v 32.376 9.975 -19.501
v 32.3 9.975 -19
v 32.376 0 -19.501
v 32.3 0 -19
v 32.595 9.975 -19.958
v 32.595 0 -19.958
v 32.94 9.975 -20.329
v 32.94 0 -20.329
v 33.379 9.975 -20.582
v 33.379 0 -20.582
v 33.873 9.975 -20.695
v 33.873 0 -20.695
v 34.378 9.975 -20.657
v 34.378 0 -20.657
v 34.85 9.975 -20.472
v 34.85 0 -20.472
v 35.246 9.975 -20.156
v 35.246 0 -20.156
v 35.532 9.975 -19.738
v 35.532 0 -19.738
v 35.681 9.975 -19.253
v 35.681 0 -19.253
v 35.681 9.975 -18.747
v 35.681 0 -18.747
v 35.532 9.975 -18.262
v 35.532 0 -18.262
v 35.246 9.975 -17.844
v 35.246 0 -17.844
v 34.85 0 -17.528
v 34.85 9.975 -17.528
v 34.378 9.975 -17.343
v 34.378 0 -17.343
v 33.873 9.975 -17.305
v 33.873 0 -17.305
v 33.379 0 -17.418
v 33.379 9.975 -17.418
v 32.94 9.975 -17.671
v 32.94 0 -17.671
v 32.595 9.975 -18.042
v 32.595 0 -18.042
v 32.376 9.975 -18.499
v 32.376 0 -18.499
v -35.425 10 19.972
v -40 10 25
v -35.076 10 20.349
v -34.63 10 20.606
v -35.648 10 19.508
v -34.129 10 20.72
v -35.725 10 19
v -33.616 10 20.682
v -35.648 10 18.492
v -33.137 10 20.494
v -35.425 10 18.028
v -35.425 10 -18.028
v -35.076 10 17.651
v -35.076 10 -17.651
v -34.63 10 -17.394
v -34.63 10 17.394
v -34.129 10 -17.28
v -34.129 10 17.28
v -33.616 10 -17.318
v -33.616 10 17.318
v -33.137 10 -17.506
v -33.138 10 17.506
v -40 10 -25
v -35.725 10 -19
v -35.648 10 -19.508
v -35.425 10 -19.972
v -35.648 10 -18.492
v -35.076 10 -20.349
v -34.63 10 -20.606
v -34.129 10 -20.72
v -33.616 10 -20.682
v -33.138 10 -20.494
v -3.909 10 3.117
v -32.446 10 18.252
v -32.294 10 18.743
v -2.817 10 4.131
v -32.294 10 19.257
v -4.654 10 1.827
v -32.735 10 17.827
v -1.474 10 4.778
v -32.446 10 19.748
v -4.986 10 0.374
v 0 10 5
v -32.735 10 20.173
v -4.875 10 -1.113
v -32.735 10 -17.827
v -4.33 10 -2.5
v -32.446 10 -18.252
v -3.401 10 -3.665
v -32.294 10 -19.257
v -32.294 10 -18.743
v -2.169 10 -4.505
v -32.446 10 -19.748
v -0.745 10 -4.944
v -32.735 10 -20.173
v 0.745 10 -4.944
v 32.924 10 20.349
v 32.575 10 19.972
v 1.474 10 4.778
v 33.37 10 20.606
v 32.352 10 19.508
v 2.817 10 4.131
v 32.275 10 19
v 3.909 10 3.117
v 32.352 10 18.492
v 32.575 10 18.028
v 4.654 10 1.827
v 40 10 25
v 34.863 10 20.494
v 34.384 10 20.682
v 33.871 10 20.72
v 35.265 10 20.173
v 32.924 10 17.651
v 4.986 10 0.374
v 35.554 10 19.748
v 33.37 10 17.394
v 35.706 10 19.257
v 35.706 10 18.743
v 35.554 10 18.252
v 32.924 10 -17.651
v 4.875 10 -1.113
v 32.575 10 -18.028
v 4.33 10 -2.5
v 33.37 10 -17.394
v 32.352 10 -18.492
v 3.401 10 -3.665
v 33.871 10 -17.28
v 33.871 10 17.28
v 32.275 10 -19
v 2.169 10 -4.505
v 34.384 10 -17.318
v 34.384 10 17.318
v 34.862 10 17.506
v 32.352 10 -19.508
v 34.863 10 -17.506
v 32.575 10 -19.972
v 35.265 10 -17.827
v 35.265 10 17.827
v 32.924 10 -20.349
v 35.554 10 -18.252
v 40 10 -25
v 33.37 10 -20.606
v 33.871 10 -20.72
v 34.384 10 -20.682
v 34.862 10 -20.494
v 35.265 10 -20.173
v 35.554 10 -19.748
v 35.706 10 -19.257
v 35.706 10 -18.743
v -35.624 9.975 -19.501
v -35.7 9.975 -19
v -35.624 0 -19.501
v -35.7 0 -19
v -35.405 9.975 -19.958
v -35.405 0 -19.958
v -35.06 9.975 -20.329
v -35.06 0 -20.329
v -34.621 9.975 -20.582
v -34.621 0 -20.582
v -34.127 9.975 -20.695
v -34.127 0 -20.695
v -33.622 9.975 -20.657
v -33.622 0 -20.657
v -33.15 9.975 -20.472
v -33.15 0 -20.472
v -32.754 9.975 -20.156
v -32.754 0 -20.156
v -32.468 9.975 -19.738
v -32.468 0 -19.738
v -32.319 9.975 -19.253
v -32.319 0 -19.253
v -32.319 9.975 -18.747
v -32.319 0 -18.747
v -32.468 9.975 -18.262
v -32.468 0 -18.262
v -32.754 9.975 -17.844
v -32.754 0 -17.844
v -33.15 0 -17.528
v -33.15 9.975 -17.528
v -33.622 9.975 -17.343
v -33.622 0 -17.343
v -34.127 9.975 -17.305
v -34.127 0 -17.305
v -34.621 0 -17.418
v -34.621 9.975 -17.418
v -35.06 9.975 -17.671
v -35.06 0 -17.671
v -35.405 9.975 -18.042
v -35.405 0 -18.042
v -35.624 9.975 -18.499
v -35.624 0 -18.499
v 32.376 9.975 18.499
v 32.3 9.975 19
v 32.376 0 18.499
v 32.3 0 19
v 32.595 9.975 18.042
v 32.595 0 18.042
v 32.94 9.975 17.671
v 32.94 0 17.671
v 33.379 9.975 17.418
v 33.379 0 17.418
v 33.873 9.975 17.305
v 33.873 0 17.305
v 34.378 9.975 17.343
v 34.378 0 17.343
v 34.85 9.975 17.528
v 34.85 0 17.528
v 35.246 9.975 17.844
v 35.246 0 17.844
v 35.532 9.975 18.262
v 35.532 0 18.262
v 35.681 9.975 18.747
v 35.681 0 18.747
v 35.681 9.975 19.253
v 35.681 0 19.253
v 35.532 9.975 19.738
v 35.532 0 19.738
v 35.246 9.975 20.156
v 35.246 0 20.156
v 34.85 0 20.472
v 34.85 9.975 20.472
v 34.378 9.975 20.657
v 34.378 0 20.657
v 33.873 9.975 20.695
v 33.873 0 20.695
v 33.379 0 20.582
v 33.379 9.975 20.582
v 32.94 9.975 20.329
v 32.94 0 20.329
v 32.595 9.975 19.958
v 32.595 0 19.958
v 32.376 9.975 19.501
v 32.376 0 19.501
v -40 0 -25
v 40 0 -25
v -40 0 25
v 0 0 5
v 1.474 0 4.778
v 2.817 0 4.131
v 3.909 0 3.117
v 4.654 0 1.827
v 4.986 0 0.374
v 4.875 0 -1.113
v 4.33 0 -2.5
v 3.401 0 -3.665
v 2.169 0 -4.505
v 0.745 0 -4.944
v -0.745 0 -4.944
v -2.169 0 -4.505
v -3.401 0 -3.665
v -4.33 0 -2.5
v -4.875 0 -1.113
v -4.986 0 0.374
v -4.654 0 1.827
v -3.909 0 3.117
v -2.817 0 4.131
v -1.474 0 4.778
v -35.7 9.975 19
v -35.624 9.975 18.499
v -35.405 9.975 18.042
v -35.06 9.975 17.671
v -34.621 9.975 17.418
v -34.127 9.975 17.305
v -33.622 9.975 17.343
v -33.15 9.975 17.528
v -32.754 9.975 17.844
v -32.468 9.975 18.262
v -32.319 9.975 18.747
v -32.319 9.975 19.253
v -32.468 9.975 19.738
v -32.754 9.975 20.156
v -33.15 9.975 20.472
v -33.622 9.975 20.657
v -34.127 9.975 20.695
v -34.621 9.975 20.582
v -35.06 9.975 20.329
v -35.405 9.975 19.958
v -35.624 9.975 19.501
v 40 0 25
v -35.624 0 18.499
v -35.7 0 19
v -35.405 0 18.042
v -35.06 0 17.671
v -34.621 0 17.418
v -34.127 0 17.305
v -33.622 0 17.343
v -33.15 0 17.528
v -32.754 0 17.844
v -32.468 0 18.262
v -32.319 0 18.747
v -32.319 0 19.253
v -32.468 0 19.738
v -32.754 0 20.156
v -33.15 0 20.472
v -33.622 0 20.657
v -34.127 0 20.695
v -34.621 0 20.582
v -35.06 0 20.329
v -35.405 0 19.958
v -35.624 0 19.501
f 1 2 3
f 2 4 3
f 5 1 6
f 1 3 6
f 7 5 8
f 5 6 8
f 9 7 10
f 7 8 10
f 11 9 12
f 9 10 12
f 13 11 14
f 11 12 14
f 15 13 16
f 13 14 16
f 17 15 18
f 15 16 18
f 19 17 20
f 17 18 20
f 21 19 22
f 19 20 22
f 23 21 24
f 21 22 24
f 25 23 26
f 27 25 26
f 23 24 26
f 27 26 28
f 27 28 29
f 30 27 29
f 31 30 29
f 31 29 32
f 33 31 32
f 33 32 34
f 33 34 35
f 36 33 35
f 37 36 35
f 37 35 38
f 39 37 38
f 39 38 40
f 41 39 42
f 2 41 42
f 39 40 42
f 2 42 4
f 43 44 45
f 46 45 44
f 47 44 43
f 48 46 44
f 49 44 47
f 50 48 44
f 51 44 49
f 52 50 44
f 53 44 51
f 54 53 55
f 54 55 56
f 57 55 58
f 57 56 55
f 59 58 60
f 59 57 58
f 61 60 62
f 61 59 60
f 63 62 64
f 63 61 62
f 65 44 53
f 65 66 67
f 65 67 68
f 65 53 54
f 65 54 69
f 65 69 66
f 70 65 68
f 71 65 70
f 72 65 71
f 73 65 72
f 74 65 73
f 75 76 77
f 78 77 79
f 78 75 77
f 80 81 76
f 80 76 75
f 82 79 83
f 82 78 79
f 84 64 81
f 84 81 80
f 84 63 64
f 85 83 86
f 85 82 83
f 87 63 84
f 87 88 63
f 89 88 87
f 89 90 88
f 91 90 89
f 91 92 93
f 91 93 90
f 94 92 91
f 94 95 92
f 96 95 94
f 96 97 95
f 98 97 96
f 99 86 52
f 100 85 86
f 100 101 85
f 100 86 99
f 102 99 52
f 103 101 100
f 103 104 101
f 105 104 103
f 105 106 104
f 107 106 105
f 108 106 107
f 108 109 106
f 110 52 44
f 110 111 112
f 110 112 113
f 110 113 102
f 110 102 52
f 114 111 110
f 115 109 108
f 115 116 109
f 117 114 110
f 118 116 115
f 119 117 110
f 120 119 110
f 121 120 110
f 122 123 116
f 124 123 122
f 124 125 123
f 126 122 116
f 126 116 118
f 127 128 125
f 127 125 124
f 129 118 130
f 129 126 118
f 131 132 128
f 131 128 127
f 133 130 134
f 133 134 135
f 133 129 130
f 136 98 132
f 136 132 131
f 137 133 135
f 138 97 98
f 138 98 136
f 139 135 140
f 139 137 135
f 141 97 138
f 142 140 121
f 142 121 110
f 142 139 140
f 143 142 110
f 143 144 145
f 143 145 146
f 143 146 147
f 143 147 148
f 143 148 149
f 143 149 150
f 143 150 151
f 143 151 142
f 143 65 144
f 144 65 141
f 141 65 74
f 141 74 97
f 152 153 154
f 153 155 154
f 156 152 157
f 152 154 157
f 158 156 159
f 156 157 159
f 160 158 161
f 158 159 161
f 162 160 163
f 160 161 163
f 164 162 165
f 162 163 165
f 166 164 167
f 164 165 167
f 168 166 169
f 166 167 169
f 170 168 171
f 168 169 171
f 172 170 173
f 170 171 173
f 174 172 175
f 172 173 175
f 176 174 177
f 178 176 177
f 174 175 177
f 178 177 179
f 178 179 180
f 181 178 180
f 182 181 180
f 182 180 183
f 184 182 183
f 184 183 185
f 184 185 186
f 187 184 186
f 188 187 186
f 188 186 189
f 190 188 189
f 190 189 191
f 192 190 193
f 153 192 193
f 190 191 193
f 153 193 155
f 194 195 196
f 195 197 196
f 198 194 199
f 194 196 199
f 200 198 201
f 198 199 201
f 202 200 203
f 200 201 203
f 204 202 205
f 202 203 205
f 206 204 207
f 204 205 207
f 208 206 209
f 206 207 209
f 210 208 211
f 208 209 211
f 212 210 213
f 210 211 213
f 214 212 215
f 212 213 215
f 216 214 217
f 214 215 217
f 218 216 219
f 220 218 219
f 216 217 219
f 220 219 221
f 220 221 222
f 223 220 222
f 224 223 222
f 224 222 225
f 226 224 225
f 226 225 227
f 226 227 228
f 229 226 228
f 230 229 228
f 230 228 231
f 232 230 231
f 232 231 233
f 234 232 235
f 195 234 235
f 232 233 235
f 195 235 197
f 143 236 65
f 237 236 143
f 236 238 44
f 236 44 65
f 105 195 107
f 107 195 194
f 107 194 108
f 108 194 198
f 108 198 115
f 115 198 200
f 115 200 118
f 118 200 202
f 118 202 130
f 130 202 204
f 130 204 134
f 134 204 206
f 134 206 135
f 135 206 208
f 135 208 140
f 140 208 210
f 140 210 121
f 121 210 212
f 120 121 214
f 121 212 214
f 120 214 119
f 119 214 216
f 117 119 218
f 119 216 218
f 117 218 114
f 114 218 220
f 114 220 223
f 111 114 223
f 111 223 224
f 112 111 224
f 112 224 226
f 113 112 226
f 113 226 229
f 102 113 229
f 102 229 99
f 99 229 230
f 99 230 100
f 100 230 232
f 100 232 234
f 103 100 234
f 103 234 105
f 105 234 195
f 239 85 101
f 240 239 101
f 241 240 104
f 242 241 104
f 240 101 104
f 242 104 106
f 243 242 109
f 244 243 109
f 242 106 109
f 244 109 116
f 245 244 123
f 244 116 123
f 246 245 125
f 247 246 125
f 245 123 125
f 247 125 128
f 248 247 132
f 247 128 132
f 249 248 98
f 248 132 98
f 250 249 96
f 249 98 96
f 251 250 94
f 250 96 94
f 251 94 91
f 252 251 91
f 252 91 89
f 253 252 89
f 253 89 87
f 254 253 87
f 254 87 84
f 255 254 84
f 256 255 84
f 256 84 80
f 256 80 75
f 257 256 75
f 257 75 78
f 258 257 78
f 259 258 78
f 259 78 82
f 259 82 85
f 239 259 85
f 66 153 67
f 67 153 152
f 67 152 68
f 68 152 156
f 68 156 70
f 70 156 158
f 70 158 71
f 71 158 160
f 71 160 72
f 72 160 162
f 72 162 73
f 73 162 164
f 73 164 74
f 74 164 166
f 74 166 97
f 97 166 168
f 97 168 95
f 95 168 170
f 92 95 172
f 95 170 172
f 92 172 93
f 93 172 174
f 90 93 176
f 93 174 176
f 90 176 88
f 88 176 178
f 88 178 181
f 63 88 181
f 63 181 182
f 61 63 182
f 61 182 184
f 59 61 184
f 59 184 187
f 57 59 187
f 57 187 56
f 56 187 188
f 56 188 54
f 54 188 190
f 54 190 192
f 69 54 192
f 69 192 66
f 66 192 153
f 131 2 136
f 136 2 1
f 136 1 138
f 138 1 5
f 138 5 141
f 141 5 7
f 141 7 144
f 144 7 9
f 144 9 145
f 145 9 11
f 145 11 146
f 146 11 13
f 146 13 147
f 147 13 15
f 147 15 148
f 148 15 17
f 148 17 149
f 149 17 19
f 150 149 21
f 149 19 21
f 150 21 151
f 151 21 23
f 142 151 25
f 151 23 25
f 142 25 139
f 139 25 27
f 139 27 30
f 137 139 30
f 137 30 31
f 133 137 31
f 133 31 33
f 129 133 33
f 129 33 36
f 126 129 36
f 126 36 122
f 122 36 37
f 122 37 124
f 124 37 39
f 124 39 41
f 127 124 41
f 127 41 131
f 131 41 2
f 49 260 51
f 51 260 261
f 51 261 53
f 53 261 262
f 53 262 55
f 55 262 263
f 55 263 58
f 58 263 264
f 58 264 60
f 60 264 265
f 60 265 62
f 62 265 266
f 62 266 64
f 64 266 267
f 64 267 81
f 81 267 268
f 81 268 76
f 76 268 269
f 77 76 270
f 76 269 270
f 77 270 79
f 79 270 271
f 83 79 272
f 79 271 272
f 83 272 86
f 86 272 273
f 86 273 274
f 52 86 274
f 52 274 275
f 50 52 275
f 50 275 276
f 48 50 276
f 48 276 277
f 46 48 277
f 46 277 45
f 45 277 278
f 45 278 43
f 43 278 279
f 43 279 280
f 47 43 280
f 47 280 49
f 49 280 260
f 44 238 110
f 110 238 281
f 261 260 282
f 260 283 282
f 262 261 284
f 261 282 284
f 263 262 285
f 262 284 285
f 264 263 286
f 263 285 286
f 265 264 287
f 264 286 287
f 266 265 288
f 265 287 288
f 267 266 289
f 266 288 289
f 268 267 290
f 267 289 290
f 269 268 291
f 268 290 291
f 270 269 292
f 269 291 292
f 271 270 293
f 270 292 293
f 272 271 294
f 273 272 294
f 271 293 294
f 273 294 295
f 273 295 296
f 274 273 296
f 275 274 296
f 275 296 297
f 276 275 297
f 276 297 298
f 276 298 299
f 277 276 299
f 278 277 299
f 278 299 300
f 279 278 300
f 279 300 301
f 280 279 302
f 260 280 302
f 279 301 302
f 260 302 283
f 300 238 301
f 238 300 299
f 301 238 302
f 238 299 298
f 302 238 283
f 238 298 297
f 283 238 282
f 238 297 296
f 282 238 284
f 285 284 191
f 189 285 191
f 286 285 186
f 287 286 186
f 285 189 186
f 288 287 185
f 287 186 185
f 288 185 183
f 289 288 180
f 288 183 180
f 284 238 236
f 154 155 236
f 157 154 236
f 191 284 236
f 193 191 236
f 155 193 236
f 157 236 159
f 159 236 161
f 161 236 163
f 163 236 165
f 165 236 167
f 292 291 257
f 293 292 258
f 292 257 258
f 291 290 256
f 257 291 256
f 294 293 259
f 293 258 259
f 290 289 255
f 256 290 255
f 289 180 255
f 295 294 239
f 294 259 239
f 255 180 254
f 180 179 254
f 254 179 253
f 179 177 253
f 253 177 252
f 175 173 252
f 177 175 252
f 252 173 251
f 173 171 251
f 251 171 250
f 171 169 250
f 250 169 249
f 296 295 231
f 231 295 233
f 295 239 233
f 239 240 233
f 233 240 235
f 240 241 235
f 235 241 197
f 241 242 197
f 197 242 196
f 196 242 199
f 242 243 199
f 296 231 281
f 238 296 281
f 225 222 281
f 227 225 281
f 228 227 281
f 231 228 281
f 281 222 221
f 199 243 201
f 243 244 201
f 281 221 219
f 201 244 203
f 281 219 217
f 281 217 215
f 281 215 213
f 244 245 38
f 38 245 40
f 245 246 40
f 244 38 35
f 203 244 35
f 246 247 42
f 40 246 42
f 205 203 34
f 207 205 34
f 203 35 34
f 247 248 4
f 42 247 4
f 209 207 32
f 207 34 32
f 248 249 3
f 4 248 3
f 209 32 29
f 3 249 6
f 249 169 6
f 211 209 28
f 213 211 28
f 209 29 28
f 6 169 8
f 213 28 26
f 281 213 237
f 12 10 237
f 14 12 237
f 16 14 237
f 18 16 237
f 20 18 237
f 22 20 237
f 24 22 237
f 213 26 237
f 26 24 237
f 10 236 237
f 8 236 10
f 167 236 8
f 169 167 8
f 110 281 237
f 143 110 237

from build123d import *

# Parameters (mm, degrees)
SKETCH1_W                      = 80
SKETCH1_H                      = 50
BOSS_EXTRUDE1_DEPTH            = 10
SKETCH2_R                      = 5
CUT_EXTRUDE1_DEPTH             = 49.218253805
M3_CLEARANCE_HOLE1_D           = 3.4
M3_CLEARANCE_HOLE1_CSINK_D     = 3.45
M3_CLEARANCE_HOLE1_CSINK_ANGLE = 90


with BuildPart() as part:
    # Sketch1 → Boss-Extrude1 (new body)
    with BuildSketch(Plane(origin=(0, 0, 0), x_dir=(1, 0, 0), z_dir=(0, 1, 0))):
        Rectangle(SKETCH1_W, SKETCH1_H)
    extrude(amount=BOSS_EXTRUDE1_DEPTH)

    # Sketch2 → Cut-Extrude1 (cut, through all)
    with BuildSketch(Plane(origin=(0, 10, 0), x_dir=(1, 0, 0), z_dir=(0, 1, 0))):
        with Locations(Location((0, 0, 0), (0, 0, 270))):
            Circle(SKETCH2_R)
    extrude(amount=-CUT_EXTRUDE1_DEPTH, mode=Mode.SUBTRACT)

    # M3 Clearance Hole1 (through all)
    with Locations(Plane(origin=(0, 10, 0), x_dir=(1, 0, 0), z_dir=(0, 1, 0))):
        with Locations((-34, 19), (34, 19), (-34, -19), (34, -19)):
            CounterSinkHole(M3_CLEARANCE_HOLE1_D / 2, M3_CLEARANCE_HOLE1_CSINK_D / 2, counter_sink_angle=M3_CLEARANCE_HOLE1_CSINK_ANGLE)


solid = part.part
